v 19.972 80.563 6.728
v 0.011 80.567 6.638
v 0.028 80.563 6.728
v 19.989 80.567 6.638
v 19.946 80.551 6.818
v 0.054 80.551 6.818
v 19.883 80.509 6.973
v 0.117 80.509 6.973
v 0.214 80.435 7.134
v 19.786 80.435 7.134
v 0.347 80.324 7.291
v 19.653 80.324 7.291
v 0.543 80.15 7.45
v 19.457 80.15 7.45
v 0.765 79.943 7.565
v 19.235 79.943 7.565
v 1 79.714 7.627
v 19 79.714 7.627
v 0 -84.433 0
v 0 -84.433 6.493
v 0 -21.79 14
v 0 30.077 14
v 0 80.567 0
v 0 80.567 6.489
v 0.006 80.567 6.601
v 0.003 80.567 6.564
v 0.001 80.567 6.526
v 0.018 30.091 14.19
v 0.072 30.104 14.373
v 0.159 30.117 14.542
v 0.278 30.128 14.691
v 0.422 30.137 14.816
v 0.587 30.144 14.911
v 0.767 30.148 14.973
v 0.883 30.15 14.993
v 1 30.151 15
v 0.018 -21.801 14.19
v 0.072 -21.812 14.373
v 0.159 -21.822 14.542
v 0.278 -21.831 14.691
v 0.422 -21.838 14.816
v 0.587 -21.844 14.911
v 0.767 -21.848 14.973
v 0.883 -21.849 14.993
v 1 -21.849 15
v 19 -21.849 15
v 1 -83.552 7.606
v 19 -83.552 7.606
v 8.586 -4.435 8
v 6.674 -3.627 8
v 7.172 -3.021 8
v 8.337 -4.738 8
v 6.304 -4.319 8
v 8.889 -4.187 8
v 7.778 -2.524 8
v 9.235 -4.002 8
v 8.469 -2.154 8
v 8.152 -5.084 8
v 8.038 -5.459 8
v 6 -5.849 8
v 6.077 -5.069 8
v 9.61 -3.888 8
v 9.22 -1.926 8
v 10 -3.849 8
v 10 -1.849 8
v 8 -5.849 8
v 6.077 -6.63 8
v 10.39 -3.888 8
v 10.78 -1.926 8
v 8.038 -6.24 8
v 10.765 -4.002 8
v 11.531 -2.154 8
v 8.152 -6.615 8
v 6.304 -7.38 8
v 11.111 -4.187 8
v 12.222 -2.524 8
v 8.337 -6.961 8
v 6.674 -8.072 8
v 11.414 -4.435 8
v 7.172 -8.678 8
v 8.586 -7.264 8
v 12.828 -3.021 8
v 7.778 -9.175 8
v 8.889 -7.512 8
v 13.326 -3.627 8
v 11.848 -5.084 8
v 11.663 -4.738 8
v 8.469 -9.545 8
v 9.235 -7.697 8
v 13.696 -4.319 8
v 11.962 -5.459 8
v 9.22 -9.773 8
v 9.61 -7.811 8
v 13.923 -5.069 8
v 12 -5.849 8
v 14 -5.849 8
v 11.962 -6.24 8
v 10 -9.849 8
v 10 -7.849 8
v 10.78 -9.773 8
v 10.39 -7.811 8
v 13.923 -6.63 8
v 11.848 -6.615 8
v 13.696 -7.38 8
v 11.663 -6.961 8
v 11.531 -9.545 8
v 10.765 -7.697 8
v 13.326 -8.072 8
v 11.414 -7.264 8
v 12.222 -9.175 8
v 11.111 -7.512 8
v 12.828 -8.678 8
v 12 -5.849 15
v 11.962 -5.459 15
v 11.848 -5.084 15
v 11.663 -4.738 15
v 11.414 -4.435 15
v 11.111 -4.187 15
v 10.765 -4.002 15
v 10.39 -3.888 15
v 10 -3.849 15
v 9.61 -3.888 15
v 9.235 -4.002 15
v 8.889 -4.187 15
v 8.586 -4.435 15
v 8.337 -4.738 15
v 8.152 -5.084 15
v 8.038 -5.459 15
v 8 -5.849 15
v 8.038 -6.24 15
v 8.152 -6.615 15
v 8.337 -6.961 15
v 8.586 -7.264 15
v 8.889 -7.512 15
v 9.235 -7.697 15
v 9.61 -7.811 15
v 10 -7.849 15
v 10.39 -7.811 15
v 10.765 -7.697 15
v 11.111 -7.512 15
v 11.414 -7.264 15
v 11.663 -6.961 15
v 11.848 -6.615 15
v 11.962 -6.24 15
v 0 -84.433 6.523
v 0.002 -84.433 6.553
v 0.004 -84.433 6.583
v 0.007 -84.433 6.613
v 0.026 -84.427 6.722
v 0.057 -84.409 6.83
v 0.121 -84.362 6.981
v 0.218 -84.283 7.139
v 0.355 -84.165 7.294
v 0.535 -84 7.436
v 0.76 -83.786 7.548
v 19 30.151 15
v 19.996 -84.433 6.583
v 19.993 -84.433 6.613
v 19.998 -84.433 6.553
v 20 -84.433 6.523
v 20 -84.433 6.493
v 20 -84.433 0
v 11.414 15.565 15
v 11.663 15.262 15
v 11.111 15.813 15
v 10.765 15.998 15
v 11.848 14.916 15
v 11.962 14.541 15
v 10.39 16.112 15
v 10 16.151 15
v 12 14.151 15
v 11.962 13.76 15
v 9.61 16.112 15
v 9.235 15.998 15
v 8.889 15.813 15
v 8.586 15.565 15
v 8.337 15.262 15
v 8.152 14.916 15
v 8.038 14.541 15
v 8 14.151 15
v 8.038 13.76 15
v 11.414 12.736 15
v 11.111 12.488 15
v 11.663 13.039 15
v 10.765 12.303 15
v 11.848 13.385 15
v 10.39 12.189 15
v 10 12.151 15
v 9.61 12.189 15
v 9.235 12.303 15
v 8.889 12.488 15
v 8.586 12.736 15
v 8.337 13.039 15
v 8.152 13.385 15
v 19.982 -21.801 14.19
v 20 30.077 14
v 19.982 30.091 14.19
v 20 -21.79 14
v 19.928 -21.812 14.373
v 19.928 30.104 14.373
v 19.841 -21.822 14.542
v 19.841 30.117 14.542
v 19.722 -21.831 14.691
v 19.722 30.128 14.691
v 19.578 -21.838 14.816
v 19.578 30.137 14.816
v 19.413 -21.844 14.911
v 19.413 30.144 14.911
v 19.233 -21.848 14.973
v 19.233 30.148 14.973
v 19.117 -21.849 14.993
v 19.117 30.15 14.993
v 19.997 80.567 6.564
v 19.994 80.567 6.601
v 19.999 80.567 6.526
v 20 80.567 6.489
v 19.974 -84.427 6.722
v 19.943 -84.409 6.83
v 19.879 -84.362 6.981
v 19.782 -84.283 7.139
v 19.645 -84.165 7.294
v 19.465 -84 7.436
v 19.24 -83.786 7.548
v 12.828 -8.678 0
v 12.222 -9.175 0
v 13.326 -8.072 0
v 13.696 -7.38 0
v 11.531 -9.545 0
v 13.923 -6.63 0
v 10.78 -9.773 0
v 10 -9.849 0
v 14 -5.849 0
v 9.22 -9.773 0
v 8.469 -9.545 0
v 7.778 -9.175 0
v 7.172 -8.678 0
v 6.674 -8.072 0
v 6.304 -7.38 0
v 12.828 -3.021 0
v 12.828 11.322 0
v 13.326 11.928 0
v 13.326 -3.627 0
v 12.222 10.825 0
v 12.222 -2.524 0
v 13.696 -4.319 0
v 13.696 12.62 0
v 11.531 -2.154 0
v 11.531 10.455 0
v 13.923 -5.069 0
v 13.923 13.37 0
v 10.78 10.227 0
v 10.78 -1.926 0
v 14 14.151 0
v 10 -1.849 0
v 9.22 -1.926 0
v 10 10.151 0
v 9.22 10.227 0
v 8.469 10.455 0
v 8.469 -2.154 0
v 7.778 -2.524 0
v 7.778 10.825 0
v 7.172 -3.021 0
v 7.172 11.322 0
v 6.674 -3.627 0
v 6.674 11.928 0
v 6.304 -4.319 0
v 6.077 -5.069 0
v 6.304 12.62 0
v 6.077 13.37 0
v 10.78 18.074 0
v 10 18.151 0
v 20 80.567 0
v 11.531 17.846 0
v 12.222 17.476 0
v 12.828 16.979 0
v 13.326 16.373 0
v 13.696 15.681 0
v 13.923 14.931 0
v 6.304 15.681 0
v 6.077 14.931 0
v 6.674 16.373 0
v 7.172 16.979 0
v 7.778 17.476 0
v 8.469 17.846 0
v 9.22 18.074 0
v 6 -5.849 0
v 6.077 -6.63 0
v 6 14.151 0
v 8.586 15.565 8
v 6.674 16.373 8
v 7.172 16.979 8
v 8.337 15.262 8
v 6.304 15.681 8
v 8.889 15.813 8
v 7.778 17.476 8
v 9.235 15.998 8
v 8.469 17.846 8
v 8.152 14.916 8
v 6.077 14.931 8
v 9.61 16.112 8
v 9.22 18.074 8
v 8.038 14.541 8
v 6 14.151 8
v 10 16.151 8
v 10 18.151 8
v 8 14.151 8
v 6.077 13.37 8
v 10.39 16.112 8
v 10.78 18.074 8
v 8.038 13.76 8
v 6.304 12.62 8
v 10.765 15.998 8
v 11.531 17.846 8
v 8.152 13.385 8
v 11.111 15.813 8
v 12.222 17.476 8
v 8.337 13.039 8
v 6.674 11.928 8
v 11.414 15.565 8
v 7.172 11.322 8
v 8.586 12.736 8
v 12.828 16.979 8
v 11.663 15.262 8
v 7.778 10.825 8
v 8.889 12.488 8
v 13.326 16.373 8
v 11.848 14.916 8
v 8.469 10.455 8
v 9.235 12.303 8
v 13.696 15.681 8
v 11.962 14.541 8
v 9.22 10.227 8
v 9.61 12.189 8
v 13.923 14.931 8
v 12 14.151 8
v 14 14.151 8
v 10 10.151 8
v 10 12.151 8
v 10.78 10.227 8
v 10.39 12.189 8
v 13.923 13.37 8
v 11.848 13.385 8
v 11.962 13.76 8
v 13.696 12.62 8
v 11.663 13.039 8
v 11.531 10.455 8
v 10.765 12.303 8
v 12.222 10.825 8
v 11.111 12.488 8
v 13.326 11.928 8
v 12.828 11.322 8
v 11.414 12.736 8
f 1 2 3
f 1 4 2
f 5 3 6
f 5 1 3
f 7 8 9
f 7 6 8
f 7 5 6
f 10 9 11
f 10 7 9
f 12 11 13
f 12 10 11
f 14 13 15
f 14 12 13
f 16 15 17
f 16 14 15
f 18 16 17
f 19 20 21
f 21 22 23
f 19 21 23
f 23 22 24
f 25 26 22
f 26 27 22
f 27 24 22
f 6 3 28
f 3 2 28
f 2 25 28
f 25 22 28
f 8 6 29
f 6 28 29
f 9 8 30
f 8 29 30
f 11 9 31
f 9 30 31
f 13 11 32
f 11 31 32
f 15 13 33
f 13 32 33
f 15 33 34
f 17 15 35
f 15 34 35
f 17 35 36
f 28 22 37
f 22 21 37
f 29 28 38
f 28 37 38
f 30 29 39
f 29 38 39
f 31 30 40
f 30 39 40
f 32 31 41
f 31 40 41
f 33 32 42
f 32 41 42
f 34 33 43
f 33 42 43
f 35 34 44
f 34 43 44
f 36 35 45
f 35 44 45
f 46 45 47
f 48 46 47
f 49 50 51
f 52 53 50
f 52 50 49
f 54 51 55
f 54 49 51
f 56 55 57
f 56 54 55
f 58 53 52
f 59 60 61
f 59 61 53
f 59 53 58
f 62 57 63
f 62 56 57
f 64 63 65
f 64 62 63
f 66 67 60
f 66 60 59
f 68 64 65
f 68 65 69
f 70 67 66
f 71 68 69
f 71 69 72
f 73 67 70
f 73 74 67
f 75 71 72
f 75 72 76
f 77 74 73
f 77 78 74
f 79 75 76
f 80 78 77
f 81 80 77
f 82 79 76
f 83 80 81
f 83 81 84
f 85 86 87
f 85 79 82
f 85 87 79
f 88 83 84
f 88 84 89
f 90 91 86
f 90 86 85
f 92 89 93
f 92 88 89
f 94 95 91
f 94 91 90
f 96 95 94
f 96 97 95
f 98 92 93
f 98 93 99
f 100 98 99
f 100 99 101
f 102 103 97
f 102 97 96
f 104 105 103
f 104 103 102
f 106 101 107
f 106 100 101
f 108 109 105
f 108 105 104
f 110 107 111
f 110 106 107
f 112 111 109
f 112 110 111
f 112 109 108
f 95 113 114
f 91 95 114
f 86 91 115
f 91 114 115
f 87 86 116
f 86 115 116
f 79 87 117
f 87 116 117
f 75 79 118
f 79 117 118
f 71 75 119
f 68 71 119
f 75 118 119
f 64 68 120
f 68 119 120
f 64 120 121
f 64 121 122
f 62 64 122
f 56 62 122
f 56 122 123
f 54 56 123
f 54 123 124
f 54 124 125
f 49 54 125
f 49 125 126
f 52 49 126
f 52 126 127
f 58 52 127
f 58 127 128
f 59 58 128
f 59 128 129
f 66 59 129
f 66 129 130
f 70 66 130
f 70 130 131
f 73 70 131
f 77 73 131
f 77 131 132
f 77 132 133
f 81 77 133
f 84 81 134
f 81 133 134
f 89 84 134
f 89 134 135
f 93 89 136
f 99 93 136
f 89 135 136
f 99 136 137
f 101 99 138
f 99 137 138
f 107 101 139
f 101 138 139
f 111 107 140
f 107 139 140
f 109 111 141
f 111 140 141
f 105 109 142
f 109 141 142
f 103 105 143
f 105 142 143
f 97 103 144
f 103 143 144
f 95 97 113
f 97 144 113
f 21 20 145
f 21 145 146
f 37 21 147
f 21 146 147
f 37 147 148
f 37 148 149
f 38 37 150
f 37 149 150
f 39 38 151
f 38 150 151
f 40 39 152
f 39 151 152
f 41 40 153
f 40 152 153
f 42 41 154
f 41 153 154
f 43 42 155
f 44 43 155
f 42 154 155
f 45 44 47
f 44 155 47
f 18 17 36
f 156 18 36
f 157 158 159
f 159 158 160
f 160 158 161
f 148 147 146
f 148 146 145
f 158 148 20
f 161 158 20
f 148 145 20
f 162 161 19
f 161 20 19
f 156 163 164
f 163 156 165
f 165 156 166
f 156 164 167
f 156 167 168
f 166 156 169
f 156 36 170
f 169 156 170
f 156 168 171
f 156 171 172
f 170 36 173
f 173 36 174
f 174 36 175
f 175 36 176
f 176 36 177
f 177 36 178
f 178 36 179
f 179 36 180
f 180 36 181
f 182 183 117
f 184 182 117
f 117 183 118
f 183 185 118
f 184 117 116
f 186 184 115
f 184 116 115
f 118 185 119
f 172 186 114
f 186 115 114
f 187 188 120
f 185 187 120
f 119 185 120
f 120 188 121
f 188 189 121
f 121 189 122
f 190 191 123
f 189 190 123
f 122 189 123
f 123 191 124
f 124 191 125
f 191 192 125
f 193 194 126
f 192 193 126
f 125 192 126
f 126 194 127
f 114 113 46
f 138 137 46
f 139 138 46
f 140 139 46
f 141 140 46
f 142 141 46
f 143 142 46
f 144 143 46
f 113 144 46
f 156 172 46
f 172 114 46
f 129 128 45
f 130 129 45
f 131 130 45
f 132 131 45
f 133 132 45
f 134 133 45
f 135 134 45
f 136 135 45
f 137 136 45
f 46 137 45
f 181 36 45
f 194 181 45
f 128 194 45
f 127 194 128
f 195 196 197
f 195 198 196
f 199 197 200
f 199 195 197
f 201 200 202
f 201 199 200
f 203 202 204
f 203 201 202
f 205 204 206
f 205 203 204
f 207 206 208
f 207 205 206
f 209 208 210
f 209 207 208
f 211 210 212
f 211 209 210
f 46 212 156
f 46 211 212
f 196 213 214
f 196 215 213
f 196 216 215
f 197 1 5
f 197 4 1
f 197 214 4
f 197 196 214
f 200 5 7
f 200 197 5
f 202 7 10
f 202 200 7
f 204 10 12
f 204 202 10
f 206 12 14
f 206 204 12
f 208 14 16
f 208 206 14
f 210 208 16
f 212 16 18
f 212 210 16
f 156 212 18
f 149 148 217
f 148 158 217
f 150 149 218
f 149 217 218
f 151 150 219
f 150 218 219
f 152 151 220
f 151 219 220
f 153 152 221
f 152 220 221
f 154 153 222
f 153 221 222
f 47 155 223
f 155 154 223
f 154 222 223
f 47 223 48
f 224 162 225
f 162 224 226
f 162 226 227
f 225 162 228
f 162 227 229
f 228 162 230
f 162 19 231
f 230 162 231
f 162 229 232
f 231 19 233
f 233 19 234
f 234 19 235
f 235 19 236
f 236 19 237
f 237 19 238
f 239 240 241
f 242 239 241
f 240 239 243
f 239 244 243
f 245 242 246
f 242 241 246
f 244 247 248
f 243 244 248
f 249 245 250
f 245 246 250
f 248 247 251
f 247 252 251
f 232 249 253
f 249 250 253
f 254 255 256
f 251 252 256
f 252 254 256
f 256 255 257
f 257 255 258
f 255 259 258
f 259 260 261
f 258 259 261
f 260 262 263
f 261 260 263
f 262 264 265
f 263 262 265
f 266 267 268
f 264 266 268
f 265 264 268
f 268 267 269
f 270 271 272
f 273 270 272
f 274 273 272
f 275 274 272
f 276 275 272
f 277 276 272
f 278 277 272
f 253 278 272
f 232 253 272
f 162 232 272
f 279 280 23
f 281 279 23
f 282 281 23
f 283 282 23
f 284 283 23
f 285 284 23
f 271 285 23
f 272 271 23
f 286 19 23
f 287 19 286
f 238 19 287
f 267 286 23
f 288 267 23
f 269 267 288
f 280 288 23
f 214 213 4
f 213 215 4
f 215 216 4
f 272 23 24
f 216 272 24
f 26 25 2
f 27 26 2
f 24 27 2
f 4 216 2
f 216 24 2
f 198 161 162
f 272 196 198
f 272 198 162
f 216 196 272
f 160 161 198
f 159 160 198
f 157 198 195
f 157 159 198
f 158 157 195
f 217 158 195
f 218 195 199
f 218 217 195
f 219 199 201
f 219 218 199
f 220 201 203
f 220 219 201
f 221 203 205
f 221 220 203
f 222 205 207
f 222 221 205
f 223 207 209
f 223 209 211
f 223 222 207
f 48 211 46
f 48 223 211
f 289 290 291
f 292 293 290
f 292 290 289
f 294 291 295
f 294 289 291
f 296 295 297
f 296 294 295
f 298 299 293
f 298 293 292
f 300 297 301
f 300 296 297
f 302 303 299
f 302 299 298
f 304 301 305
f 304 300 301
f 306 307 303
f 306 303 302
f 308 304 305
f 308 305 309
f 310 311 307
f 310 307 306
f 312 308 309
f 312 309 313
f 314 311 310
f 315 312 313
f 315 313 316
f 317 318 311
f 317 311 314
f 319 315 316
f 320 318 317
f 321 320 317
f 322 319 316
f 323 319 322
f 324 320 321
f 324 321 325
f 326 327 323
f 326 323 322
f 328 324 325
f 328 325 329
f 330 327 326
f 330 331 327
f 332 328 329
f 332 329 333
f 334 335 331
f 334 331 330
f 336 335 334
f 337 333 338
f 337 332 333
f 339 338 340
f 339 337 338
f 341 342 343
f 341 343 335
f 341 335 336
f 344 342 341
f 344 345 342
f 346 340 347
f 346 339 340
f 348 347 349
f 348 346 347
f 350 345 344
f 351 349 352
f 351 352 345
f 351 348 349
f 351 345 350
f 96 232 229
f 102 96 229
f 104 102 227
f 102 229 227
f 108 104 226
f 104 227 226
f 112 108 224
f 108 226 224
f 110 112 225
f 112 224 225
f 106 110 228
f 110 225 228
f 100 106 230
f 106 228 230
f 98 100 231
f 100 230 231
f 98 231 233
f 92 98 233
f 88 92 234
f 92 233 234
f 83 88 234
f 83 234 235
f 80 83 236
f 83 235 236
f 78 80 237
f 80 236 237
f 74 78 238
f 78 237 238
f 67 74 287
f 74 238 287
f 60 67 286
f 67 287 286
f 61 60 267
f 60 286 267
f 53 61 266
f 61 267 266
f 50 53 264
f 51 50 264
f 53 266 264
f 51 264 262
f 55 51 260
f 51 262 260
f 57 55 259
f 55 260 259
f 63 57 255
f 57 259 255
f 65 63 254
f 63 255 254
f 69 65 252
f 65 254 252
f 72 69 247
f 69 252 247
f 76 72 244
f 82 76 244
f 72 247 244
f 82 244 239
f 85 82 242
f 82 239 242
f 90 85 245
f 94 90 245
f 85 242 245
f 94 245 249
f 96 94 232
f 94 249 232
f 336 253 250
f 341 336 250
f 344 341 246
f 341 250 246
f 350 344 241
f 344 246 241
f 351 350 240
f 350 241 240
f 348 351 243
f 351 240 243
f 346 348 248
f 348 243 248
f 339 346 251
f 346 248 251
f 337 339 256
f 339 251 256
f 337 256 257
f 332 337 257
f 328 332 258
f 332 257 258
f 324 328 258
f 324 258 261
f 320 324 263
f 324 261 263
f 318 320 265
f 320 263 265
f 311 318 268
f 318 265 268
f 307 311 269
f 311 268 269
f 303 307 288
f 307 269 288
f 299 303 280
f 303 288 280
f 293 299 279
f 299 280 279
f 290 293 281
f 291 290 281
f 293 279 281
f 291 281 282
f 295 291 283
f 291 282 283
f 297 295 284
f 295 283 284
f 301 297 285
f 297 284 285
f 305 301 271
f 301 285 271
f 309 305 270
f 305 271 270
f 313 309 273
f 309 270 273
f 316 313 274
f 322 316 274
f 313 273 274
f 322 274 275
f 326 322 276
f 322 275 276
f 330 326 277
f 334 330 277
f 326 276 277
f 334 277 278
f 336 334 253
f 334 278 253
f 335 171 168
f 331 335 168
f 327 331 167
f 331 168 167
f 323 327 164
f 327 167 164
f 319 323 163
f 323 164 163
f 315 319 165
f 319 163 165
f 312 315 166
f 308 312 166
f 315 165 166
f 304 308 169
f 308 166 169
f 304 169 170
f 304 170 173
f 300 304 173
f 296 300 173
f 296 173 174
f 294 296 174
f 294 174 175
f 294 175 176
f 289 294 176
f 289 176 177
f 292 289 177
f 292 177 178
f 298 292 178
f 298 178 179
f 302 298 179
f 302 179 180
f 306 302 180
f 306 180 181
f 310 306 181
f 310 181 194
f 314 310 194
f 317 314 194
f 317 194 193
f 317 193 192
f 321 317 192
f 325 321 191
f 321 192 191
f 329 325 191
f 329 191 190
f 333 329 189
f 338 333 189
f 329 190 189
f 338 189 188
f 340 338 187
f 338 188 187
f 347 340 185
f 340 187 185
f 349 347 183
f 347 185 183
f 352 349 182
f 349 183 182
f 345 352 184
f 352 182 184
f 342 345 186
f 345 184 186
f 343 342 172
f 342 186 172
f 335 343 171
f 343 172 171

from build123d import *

# Parameters (mm, degrees)
PAD_DEPTH       = 20
SKETCH001_R     = 2
POCKET_DEPTH    = 15.001
SKETCH002_R     = 4
POCKET001_DEPTH = 8
FILLET_R        = 1


with BuildPart() as part:
    # Sketch (on YZ_Plane of Origin) → Pad (new body)
    with BuildSketch(Plane.YZ):
        Polygon((-84.432856, 0), (80.567144, 0), (80.567144, 7.5), (30.15051, 15), (-21.84949, 15), (-84.432856, 7.5), align=None)
    extrude(amount=PAD_DEPTH)

    # Sketch001 (on Face4 of Pad) → Pocket (cut, through all)
    with BuildSketch(Plane.XY.offset(15)):
        with Locations((10, 14.15051)):
            Circle(SKETCH001_R)
        with Locations((10, -5.84949)):
            Circle(SKETCH001_R)
    extrude(amount=-POCKET_DEPTH, mode=Mode.SUBTRACT)

    # Sketch002 (on Face1 of Pocket) → Pocket001 (cut)
    with BuildSketch(Plane(origin=(0, 0, 0), x_dir=(1, 0, 0), z_dir=(0, 0, -1))):
        with Locations((10, 5.84949)):
            Circle(SKETCH002_R)
        with Locations((10, -14.15051)):
            Circle(SKETCH002_R)
    extrude(amount=-POCKET001_DEPTH, mode=Mode.SUBTRACT)

    # Fillet
    fillet_edges = [part.edges().sort_by_distance(p)[0] for p in [
        (10, -84.432856, 7.5),
        (0, -53.141173, 11.25),
        (20, -53.141173, 11.25),
        (20, 4.15051, 15),
        (0, 4.15051, 15),
        (0, 55.358827, 11.25),
        (20, 55.358827, 11.25),
        (10, 80.567144, 7.5),
    ]]
    fillet(fillet_edges, radius=FILLET_R)


solid = part.part
